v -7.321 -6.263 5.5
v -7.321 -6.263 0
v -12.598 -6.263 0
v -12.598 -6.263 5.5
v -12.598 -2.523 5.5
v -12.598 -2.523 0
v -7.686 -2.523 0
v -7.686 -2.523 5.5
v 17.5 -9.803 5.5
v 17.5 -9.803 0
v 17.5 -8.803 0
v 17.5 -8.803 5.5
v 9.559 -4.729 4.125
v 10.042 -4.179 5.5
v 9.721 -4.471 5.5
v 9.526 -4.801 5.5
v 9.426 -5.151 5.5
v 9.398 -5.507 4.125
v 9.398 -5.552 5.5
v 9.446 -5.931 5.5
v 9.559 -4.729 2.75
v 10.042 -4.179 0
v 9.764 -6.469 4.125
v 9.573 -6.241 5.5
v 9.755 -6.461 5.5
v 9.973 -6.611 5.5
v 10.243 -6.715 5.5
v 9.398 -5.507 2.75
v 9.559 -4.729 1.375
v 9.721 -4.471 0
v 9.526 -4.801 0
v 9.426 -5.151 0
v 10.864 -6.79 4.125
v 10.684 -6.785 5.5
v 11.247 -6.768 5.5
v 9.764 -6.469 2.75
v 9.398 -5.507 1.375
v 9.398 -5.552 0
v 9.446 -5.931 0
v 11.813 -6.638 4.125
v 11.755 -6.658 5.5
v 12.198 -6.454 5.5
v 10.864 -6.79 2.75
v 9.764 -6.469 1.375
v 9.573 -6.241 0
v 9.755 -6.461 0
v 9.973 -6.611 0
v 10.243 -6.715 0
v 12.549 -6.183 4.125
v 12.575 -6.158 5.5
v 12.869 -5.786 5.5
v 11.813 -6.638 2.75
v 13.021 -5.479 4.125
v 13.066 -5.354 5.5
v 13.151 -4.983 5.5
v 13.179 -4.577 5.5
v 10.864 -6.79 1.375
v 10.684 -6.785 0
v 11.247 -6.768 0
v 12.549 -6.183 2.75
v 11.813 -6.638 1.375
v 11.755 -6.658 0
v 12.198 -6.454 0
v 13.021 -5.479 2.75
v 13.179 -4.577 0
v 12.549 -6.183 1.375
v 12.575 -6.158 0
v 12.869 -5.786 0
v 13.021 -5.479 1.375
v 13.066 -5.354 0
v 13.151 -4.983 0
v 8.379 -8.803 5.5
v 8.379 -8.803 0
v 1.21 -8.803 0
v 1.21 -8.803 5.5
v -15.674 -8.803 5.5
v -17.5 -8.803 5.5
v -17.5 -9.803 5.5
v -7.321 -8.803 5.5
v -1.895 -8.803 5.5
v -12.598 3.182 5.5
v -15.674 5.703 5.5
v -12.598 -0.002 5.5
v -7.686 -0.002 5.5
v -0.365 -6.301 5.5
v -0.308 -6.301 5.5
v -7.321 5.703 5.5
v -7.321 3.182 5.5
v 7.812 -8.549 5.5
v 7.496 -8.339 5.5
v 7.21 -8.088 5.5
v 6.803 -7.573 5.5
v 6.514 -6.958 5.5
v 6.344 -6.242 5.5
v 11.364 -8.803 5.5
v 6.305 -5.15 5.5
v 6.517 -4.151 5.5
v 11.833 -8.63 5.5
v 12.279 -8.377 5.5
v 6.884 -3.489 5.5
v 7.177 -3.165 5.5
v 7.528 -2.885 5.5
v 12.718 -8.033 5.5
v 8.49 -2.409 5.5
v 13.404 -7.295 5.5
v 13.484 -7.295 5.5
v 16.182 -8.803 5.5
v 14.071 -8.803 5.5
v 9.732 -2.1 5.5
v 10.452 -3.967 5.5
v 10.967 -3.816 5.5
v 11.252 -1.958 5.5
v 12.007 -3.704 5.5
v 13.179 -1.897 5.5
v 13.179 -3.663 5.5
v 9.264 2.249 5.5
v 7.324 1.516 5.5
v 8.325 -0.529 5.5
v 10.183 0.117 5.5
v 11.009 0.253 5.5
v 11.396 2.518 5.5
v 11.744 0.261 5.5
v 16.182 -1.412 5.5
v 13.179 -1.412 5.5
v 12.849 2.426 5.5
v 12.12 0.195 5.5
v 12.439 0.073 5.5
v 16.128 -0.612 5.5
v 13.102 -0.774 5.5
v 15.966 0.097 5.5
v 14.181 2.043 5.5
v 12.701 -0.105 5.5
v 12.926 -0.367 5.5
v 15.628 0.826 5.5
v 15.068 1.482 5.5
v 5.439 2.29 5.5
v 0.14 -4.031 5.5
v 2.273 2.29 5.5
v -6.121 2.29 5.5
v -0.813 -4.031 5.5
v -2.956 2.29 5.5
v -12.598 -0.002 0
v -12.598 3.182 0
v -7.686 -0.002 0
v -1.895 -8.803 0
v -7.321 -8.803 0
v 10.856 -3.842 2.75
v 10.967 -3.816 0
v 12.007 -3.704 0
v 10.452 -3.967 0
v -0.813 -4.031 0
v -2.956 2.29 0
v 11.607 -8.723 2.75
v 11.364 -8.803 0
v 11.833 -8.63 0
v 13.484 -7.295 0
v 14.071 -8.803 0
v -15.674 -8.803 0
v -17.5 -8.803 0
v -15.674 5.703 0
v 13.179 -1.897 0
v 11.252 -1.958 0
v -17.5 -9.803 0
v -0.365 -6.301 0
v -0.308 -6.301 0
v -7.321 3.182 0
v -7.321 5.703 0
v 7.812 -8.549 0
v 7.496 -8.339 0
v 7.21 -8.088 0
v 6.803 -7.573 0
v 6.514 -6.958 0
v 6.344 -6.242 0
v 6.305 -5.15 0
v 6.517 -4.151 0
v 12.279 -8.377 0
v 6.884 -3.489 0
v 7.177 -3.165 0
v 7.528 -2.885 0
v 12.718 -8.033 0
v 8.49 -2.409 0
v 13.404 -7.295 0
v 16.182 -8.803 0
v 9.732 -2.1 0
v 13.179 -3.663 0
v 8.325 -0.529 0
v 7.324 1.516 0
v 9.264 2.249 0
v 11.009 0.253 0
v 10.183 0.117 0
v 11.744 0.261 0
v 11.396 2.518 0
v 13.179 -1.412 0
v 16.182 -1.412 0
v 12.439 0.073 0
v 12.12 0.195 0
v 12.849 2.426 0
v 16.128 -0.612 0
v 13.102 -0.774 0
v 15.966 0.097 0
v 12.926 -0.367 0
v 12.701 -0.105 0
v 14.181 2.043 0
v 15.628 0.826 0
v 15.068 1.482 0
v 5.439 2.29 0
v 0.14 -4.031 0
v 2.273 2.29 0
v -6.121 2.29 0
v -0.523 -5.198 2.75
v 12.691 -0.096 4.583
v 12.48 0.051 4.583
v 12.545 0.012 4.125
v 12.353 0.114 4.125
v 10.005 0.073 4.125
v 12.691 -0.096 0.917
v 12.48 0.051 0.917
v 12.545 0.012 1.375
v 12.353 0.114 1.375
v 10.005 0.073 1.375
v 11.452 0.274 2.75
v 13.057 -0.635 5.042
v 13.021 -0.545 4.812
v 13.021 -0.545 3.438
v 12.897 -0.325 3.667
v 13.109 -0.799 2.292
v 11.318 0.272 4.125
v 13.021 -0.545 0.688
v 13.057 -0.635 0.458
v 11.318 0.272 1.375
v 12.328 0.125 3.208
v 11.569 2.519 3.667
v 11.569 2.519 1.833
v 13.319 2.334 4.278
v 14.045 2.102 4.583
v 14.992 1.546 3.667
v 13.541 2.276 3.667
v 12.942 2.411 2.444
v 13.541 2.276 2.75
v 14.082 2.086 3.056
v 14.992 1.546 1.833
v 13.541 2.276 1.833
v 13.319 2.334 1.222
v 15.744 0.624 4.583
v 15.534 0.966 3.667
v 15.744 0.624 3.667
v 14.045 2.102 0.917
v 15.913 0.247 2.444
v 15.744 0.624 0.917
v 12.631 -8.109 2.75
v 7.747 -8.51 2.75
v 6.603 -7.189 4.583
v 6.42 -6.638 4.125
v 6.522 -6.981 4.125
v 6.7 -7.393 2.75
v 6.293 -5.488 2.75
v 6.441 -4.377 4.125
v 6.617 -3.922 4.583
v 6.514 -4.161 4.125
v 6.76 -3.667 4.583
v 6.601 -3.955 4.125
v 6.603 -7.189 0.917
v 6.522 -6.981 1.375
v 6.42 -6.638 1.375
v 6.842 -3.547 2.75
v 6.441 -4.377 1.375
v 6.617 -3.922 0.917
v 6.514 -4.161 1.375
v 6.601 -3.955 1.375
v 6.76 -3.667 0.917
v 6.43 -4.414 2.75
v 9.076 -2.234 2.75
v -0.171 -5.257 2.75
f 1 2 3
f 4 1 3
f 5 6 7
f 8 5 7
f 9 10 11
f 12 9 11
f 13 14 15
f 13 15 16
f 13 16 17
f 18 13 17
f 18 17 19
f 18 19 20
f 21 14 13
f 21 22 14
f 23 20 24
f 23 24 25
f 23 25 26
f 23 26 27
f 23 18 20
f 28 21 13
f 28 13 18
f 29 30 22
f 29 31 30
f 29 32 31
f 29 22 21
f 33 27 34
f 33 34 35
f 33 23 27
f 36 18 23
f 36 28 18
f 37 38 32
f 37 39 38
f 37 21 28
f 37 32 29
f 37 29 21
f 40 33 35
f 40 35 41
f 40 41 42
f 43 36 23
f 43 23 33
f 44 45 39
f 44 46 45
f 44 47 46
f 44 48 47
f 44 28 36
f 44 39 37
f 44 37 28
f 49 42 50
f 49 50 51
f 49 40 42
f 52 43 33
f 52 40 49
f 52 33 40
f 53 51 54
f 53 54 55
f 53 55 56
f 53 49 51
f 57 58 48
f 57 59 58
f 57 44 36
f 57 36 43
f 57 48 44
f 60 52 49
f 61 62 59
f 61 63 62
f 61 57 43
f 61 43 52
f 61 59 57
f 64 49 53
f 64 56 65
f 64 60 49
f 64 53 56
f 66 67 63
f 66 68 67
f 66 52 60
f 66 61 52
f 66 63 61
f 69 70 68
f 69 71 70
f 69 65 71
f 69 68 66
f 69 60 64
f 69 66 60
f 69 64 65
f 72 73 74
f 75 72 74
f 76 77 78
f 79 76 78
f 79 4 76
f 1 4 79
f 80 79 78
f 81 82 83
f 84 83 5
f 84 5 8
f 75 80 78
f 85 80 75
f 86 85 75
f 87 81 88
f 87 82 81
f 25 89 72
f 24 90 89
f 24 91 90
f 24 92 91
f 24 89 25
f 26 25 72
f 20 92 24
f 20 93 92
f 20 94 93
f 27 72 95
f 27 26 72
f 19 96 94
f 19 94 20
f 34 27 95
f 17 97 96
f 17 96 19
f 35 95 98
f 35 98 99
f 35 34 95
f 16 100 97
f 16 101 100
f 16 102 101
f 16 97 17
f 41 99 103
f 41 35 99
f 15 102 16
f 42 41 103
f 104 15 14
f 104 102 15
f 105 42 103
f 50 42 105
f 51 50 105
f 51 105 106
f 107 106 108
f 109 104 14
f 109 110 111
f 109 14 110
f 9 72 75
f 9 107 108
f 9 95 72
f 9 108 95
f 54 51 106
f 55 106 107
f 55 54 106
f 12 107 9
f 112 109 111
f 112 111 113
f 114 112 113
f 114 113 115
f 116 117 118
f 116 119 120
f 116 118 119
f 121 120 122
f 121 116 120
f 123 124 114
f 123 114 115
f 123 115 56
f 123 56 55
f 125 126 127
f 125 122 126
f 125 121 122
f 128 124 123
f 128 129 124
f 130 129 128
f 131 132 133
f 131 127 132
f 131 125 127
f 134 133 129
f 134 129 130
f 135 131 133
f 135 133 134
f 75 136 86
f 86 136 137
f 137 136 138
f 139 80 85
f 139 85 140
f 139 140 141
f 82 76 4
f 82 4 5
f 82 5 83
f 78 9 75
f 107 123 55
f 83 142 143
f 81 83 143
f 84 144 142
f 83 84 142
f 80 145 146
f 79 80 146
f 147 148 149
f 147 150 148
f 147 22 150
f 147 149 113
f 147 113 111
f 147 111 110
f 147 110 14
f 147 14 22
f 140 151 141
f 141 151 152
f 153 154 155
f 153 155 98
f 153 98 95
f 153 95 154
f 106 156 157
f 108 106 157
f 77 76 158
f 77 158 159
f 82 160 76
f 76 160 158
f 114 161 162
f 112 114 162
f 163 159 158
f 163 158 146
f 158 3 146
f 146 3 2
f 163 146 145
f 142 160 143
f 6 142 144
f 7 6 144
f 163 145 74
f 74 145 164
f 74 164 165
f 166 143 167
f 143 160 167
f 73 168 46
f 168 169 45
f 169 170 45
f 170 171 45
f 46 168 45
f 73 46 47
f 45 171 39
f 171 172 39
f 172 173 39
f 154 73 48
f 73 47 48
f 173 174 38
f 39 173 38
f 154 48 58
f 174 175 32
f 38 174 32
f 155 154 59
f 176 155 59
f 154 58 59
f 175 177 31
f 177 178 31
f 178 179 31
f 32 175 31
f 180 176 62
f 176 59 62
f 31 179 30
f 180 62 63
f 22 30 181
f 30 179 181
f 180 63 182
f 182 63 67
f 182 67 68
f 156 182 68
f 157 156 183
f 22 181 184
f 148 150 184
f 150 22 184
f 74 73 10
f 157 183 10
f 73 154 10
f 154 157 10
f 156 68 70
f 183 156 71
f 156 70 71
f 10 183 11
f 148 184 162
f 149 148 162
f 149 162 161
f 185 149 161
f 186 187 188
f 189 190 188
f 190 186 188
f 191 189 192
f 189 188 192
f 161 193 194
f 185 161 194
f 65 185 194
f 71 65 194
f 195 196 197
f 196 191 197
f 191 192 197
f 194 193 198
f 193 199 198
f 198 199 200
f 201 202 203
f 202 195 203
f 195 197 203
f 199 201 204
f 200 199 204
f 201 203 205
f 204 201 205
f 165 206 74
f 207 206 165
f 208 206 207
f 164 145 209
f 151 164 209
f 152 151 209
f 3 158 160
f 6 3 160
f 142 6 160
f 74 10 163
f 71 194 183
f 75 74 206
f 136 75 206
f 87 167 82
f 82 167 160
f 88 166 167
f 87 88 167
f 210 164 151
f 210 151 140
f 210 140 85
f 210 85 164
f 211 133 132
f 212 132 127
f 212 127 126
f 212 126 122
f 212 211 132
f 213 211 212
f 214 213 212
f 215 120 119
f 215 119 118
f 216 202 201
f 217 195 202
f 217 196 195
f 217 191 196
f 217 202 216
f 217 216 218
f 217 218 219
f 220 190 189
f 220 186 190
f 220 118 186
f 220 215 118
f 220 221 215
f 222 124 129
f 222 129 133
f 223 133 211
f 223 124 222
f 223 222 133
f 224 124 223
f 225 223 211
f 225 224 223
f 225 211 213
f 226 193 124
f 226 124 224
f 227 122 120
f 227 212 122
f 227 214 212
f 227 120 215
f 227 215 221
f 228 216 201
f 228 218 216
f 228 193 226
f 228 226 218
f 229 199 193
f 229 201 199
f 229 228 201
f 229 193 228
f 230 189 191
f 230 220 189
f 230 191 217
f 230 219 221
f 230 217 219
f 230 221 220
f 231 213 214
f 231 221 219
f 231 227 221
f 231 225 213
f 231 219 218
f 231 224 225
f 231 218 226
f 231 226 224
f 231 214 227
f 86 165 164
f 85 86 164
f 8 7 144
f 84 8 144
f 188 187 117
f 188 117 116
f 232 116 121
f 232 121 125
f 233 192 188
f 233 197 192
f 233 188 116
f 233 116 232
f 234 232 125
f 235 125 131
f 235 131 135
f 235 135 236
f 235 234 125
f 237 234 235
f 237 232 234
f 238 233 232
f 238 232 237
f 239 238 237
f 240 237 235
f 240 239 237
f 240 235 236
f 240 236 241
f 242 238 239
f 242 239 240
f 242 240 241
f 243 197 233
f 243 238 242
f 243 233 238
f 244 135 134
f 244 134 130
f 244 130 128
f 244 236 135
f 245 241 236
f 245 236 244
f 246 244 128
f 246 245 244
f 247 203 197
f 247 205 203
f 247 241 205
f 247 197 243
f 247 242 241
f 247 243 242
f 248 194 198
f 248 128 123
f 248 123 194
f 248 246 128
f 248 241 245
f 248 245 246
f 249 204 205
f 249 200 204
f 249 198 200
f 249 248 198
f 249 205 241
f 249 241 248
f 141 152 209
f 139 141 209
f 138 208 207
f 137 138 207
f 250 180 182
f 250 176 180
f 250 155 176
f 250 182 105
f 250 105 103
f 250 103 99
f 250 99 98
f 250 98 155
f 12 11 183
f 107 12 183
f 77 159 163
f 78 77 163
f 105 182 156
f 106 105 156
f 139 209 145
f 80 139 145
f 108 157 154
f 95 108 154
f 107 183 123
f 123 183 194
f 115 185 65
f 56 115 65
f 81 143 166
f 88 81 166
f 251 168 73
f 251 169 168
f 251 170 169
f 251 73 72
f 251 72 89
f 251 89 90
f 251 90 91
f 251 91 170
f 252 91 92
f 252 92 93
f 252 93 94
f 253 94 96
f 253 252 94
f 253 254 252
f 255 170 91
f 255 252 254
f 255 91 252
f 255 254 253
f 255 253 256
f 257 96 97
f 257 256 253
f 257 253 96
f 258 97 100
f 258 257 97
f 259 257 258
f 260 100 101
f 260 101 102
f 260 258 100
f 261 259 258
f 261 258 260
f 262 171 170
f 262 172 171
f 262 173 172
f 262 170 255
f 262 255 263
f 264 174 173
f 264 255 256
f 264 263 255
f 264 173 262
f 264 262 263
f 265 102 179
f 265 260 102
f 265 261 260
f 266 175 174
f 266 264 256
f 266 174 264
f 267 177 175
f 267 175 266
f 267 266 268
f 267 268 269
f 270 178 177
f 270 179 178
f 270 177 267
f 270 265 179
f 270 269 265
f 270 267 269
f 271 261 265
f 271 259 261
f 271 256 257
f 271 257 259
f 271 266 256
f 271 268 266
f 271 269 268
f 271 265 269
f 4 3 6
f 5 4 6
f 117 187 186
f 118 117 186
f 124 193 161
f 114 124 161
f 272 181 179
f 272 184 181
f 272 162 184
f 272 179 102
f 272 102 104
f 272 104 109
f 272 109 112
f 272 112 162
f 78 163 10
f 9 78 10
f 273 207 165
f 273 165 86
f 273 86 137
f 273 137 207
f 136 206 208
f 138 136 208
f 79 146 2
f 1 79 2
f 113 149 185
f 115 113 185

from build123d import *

# Parameters (mm, degrees)
F1_DEPTH = 5.5
F2_DEPTH = 5


with BuildPart() as f1:
    # F0 (on Top) → F1 (new body)
    with BuildSketch(Plane.XY):
        with BuildLine():
            Line((-15.6744375907, -8.8027354735), (-17.5, -8.8027354735))
            Line((-17.5, -8.8027354735), (-17.5, -9.8027354735))
            Line((-17.5, -9.8027354735), (17.5, -9.8027354735))
            Line((17.5, -9.8027354735), (17.5, -8.8027354735))
            Line((17.5, -8.8027354735), (16.1824201742, -8.8027354735))
            Line((16.1824201742, -8.8027354735), (14.0711175617, -8.8027354735))
            Line((14.0711175617, -8.8027354735), (11.3642028302, -8.8027354735))
            add(Edge.make_bspline(
                [(11.3642028302, -8.8027354735), (10.6755229249, -9.0027536157), (9.724691582, -9.0027536157)],
                knots=[0.2677635541, 0.2677635541, 0.2677635541, 1, 1, 1], degree=2))
            add(Edge.make_bspline(
                [(9.724691582, -9.0027536157), (8.977777142, -9.0027536157), (8.3794872938, -8.8027354735)],
                knots=[0, 0, 0, 0.4677071733, 0.4677071733, 0.4677071733], degree=2))
            Line((8.3794872938, -8.8027354735), (1.2096335269, -8.8027354735))
            Line((1.2096335269, -8.8027354735), (-1.8954100145, -8.8027354735))
            Line((-1.8954100145, -8.8027354735), (-7.321298984, -8.8027354735))
            Line((-7.321298984, -8.8027354735), (-15.6744375907, -8.8027354735))
        make_face()
        Polygon((-15.6744375907, 5.7033421753), (-15.6744375907, -8.8027354735), (-7.321298984, -8.8027354735), (-7.321298984, -6.2628225562), (-12.5979680697, -6.2628225562), (-12.5979680697, -2.5228007856), (-7.6864114659, -2.5228007856), (-7.6864114659, -0.0019372152), (-12.5979680697, -0.0019372152), (-12.5979680697, 3.1824786049), (-7.321298984, 3.1824786049), (-7.321298984, 5.7033421753), align=None)
        with BuildLine():
            Line((-6.1211901306, 2.2903341927), (-1.8954100145, -8.8027354735))
            Line((-1.8954100145, -8.8027354735), (1.2096335269, -8.8027354735))
            Line((1.2096335269, -8.8027354735), (5.4385885341, 2.2903341927))
            Line((5.4385885341, 2.2903341927), (2.273222061, 2.2903341927))
            Line((2.273222061, 2.2903341927), (0.1396952104, -4.0308740802))
            add(Edge.make_bspline(
                [(-0.3079644412, -6.30092125), (-0.2571661829, -5.348453906), (0.1396952104, -4.0308740802)],
                knots=[0, 0, 0, 1, 1, 1], degree=2))
            Line((-0.3079644412, -6.30092125), (-0.3651124819, -6.30092125))
            add(Edge.make_bspline(
                [(-0.8127721335, -4.0308740802), (-0.4571843251, -5.2309829336), (-0.3651124819, -6.30092125)],
                knots=[0, 0, 0, 1, 1, 1], degree=2))
            Line((-0.8127721335, -4.0308740802), (-2.9558236575, 2.2903341927))
            Line((-2.9558236575, 2.2903341927), (-6.1211901306, 2.2903341927))
        make_face()
        with BuildLine():
            Line((14.0711175617, -8.8027354735), (16.1824201742, -8.8027354735))
            Line((16.1824201742, -8.8027354735), (16.1824201742, -1.4115888843))
            add(Edge.make_bspline(
                [(14.9918359942, 1.5458222188), (16.1824201742, 0.5727180824), (16.1824201742, -1.4115888843)],
                knots=[0, 0, 0, 1, 1, 1], degree=2))
            add(Edge.make_bspline(
                [(11.5693033382, 2.5189263552), (13.8012518142, 2.5189263552), (14.9918359942, 1.5458222188)],
                knots=[0, 0, 0, 1, 1, 1], degree=2))
            add(Edge.make_bspline(
                [(7.3244738752, 1.5156607529), (9.2389332366, 2.5189263552), (11.5693033382, 2.5189263552)],
                knots=[0, 0, 0, 1, 1, 1], degree=2))
            Line((7.3244738752, 1.5156607529), (8.3245645864, -0.5289691455))
            add(Edge.make_bspline(
                [(11.4518323657, 0.2742783146), (10.1215529753, 0.2742783146), (8.3245645864, -0.5289691455)],
                knots=[0, 0, 0, 1, 1, 1], degree=2))
            add(Edge.make_bspline(
                [(13.1789731495, -1.4115888843), (13.1789731495, 0.2742783146), (11.4518323657, 0.2742783146)],
                knots=[0, 0, 0, 1, 1, 1], degree=2))
            Line((13.1789731495, -1.4115888843), (13.1789731495, -1.8973472297))
            Line((13.1789731495, -1.8973472297), (11.2518142235, -1.9576701615))
            add(Edge.make_bspline(
                [(7.5276669086, -2.8847383763), (8.7626995646, -2.0465671136), (11.2518142235, -1.9576701615)],
                knots=[0, 0, 0, 1, 1, 1], degree=2))
            add(Edge.make_bspline(
                [(6.2926342525, -5.4881491165), (6.2926342525, -3.722909639), (7.5276669086, -2.8847383763)],
                knots=[0, 0, 0, 1, 1, 1], degree=2))
            add(Edge.make_bspline(
                [(7.2101777939, -8.0883849655), (6.2926342525, -7.1740163153), (6.2926342525, -5.4881491165)],
                knots=[0, 0, 0, 1, 1, 1], degree=2))
            add(Edge.make_bspline(
                [(8.3794872938, -8.8027354735), (7.6985796391, -8.575096839), (7.2101777939, -8.0883849655)],
                knots=[0.4677071733, 0.4677071733, 0.4677071733, 1, 1, 1], degree=2))
            Line((8.3794872938, -8.8027354735), (11.3642028302, -8.8027354735))
            add(Edge.make_bspline(
                [(11.8328193033, -8.629703906), (11.6160386684, -8.7295930221), (11.3642028302, -8.8027354735)],
                knots=[0, 0, 0, 0.2677635541, 0.2677635541, 0.2677635541], degree=2))
            add(Edge.make_bspline(
                [(13.4043904209, -7.2946621789), (12.6424165457, -8.2566541963), (11.8328193033, -8.629703906)],
                knots=[0, 0, 0, 1, 1, 1], degree=2))
            Line((13.4043904209, -7.2946621789), (13.4837626996, -7.2946621789))
            Line((13.4837626996, -7.2946621789), (14.0711175617, -8.8027354735))
        make_face()
        with BuildLine():
            Line((12.0074383164, -3.7038602921), (13.1789731495, -3.6625867072))
            Line((13.1789731495, -3.6625867072), (13.1789731495, -4.5769553574))
            add(Edge.make_bspline(
                [(12.5487572569, -6.1834502776), (13.1789731495, -5.5770460686), (13.1789731495, -4.5769553574)],
                knots=[0, 0, 0, 1, 1, 1], degree=2))
            add(Edge.make_bspline(
                [(10.8644775036, -6.7898544866), (11.9185413643, -6.7898544866), (12.5487572569, -6.1834502776)],
                knots=[0, 0, 0, 1, 1, 1], degree=2))
            add(Edge.make_bspline(
                [(9.3976777939, -5.5071984634), (9.3976777939, -6.7898544866), (10.8644775036, -6.7898544866)],
                knots=[0, 0, 0, 1, 1, 1], degree=2))
            add(Edge.make_bspline(
                [(10.0421806967, -4.1785065185), (9.3976777939, -4.6150540512), (9.3976777939, -5.5071984634)],
                knots=[0, 0, 0, 1, 1, 1], degree=2))
            add(Edge.make_bspline(
                [(12.0074383164, -3.7038602921), (10.6866835994, -3.7419589859), (10.0421806967, -4.1785065185)],
                knots=[0, 0, 0, 1, 1, 1], degree=2))
        make_face(mode=Mode.SUBTRACT)
        with BuildLine():
            Line((11.3642028302, -8.8027354735), (8.3794872938, -8.8027354735))
            add(Edge.make_bspline(
                [(9.724691582, -9.0027536157), (8.977777142, -9.0027536157), (8.3794872938, -8.8027354735)],
                knots=[0, 0, 0, 0.4677071733, 0.4677071733, 0.4677071733], degree=2))
            add(Edge.make_bspline(
                [(11.3642028302, -8.8027354735), (10.6755229249, -9.0027536157), (9.724691582, -9.0027536157)],
                knots=[0.2677635541, 0.2677635541, 0.2677635541, 1, 1, 1], degree=2))
        make_face()
    extrude(amount=F1_DEPTH)

    # F0 (on Top) → F2 (join)
    with BuildSketch(Plane.XY):
        with BuildLine():
            Line((-15.6744375907, -8.8027354735), (-17.5, -8.8027354735))
            Line((-17.5, -8.8027354735), (-17.5, -9.8027354735))
            Line((-17.5, -9.8027354735), (17.5, -9.8027354735))
            Line((17.5, -9.8027354735), (17.5, -8.8027354735))
            Line((17.5, -8.8027354735), (16.1824201742, -8.8027354735))
            Line((16.1824201742, -8.8027354735), (14.0711175617, -8.8027354735))
            Line((14.0711175617, -8.8027354735), (11.3642028302, -8.8027354735))
            add(Edge.make_bspline(
                [(11.3642028302, -8.8027354735), (10.6755229249, -9.0027536157), (9.724691582, -9.0027536157)],
                knots=[0.2677635541, 0.2677635541, 0.2677635541, 1, 1, 1], degree=2))
            add(Edge.make_bspline(
                [(9.724691582, -9.0027536157), (8.977777142, -9.0027536157), (8.3794872938, -8.8027354735)],
                knots=[0, 0, 0, 0.4677071733, 0.4677071733, 0.4677071733], degree=2))
            Line((8.3794872938, -8.8027354735), (1.2096335269, -8.8027354735))
            Line((1.2096335269, -8.8027354735), (-1.8954100145, -8.8027354735))
            Line((-1.8954100145, -8.8027354735), (-7.321298984, -8.8027354735))
            Line((-7.321298984, -8.8027354735), (-15.6744375907, -8.8027354735))
        make_face()
        Polygon((-15.6744375907, 5.7033421753), (-15.6744375907, -8.8027354735), (-7.321298984, -8.8027354735), (-7.321298984, -6.2628225562), (-12.5979680697, -6.2628225562), (-12.5979680697, -2.5228007856), (-7.6864114659, -2.5228007856), (-7.6864114659, -0.0019372152), (-12.5979680697, -0.0019372152), (-12.5979680697, 3.1824786049), (-7.321298984, 3.1824786049), (-7.321298984, 5.7033421753), align=None)
        with BuildLine():
            Line((-6.1211901306, 2.2903341927), (-1.8954100145, -8.8027354735))
            Line((-1.8954100145, -8.8027354735), (1.2096335269, -8.8027354735))
            Line((1.2096335269, -8.8027354735), (5.4385885341, 2.2903341927))
            Line((5.4385885341, 2.2903341927), (2.273222061, 2.2903341927))
            Line((2.273222061, 2.2903341927), (0.1396952104, -4.0308740802))
            add(Edge.make_bspline(
                [(-0.3079644412, -6.30092125), (-0.2571661829, -5.348453906), (0.1396952104, -4.0308740802)],
                knots=[0, 0, 0, 1, 1, 1], degree=2))
            Line((-0.3079644412, -6.30092125), (-0.3651124819, -6.30092125))
            add(Edge.make_bspline(
                [(-0.8127721335, -4.0308740802), (-0.4571843251, -5.2309829336), (-0.3651124819, -6.30092125)],
                knots=[0, 0, 0, 1, 1, 1], degree=2))
            Line((-0.8127721335, -4.0308740802), (-2.9558236575, 2.2903341927))
            Line((-2.9558236575, 2.2903341927), (-6.1211901306, 2.2903341927))
        make_face()
        with BuildLine():
            Line((14.0711175617, -8.8027354735), (16.1824201742, -8.8027354735))
            Line((16.1824201742, -8.8027354735), (16.1824201742, -1.4115888843))
            add(Edge.make_bspline(
                [(14.9918359942, 1.5458222188), (16.1824201742, 0.5727180824), (16.1824201742, -1.4115888843)],
                knots=[0, 0, 0, 1, 1, 1], degree=2))
            add(Edge.make_bspline(
                [(11.5693033382, 2.5189263552), (13.8012518142, 2.5189263552), (14.9918359942, 1.5458222188)],
                knots=[0, 0, 0, 1, 1, 1], degree=2))
            add(Edge.make_bspline(
                [(7.3244738752, 1.5156607529), (9.2389332366, 2.5189263552), (11.5693033382, 2.5189263552)],
                knots=[0, 0, 0, 1, 1, 1], degree=2))
            Line((7.3244738752, 1.5156607529), (8.3245645864, -0.5289691455))
            add(Edge.make_bspline(
                [(11.4518323657, 0.2742783146), (10.1215529753, 0.2742783146), (8.3245645864, -0.5289691455)],
                knots=[0, 0, 0, 1, 1, 1], degree=2))
            add(Edge.make_bspline(
                [(13.1789731495, -1.4115888843), (13.1789731495, 0.2742783146), (11.4518323657, 0.2742783146)],
                knots=[0, 0, 0, 1, 1, 1], degree=2))
            Line((13.1789731495, -1.4115888843), (13.1789731495, -1.8973472297))
            Line((13.1789731495, -1.8973472297), (11.2518142235, -1.9576701615))
            add(Edge.make_bspline(
                [(7.5276669086, -2.8847383763), (8.7626995646, -2.0465671136), (11.2518142235, -1.9576701615)],
                knots=[0, 0, 0, 1, 1, 1], degree=2))
            add(Edge.make_bspline(
                [(6.2926342525, -5.4881491165), (6.2926342525, -3.722909639), (7.5276669086, -2.8847383763)],
                knots=[0, 0, 0, 1, 1, 1], degree=2))
            add(Edge.make_bspline(
                [(7.2101777939, -8.0883849655), (6.2926342525, -7.1740163153), (6.2926342525, -5.4881491165)],
                knots=[0, 0, 0, 1, 1, 1], degree=2))
            add(Edge.make_bspline(
                [(8.3794872938, -8.8027354735), (7.6985796391, -8.575096839), (7.2101777939, -8.0883849655)],
                knots=[0.4677071733, 0.4677071733, 0.4677071733, 1, 1, 1], degree=2))
            Line((8.3794872938, -8.8027354735), (11.3642028302, -8.8027354735))
            add(Edge.make_bspline(
                [(11.8328193033, -8.629703906), (11.6160386684, -8.7295930221), (11.3642028302, -8.8027354735)],
                knots=[0, 0, 0, 0.2677635541, 0.2677635541, 0.2677635541], degree=2))
            add(Edge.make_bspline(
                [(13.4043904209, -7.2946621789), (12.6424165457, -8.2566541963), (11.8328193033, -8.629703906)],
                knots=[0, 0, 0, 1, 1, 1], degree=2))
            Line((13.4043904209, -7.2946621789), (13.4837626996, -7.2946621789))
            Line((13.4837626996, -7.2946621789), (14.0711175617, -8.8027354735))
        make_face()
        with BuildLine():
            Line((12.0074383164, -3.7038602921), (13.1789731495, -3.6625867072))
            Line((13.1789731495, -3.6625867072), (13.1789731495, -4.5769553574))
            add(Edge.make_bspline(
                [(12.5487572569, -6.1834502776), (13.1789731495, -5.5770460686), (13.1789731495, -4.5769553574)],
                knots=[0, 0, 0, 1, 1, 1], degree=2))
            add(Edge.make_bspline(
                [(10.8644775036, -6.7898544866), (11.9185413643, -6.7898544866), (12.5487572569, -6.1834502776)],
                knots=[0, 0, 0, 1, 1, 1], degree=2))
            add(Edge.make_bspline(
                [(9.3976777939, -5.5071984634), (9.3976777939, -6.7898544866), (10.8644775036, -6.7898544866)],
                knots=[0, 0, 0, 1, 1, 1], degree=2))
            add(Edge.make_bspline(
                [(10.0421806967, -4.1785065185), (9.3976777939, -4.6150540512), (9.3976777939, -5.5071984634)],
                knots=[0, 0, 0, 1, 1, 1], degree=2))
            add(Edge.make_bspline(
                [(12.0074383164, -3.7038602921), (10.6866835994, -3.7419589859), (10.0421806967, -4.1785065185)],
                knots=[0, 0, 0, 1, 1, 1], degree=2))
        make_face(mode=Mode.SUBTRACT)
        with BuildLine():
            Line((11.3642028302, -8.8027354735), (8.3794872938, -8.8027354735))
            add(Edge.make_bspline(
                [(9.724691582, -9.0027536157), (8.977777142, -9.0027536157), (8.3794872938, -8.8027354735)],
                knots=[0, 0, 0, 0.4677071733, 0.4677071733, 0.4677071733], degree=2))
            add(Edge.make_bspline(
                [(11.3642028302, -8.8027354735), (10.6755229249, -9.0027536157), (9.724691582, -9.0027536157)],
                knots=[0.2677635541, 0.2677635541, 0.2677635541, 1, 1, 1], degree=2))
        make_face()
    extrude(amount=F2_DEPTH)


solid = f1.part
